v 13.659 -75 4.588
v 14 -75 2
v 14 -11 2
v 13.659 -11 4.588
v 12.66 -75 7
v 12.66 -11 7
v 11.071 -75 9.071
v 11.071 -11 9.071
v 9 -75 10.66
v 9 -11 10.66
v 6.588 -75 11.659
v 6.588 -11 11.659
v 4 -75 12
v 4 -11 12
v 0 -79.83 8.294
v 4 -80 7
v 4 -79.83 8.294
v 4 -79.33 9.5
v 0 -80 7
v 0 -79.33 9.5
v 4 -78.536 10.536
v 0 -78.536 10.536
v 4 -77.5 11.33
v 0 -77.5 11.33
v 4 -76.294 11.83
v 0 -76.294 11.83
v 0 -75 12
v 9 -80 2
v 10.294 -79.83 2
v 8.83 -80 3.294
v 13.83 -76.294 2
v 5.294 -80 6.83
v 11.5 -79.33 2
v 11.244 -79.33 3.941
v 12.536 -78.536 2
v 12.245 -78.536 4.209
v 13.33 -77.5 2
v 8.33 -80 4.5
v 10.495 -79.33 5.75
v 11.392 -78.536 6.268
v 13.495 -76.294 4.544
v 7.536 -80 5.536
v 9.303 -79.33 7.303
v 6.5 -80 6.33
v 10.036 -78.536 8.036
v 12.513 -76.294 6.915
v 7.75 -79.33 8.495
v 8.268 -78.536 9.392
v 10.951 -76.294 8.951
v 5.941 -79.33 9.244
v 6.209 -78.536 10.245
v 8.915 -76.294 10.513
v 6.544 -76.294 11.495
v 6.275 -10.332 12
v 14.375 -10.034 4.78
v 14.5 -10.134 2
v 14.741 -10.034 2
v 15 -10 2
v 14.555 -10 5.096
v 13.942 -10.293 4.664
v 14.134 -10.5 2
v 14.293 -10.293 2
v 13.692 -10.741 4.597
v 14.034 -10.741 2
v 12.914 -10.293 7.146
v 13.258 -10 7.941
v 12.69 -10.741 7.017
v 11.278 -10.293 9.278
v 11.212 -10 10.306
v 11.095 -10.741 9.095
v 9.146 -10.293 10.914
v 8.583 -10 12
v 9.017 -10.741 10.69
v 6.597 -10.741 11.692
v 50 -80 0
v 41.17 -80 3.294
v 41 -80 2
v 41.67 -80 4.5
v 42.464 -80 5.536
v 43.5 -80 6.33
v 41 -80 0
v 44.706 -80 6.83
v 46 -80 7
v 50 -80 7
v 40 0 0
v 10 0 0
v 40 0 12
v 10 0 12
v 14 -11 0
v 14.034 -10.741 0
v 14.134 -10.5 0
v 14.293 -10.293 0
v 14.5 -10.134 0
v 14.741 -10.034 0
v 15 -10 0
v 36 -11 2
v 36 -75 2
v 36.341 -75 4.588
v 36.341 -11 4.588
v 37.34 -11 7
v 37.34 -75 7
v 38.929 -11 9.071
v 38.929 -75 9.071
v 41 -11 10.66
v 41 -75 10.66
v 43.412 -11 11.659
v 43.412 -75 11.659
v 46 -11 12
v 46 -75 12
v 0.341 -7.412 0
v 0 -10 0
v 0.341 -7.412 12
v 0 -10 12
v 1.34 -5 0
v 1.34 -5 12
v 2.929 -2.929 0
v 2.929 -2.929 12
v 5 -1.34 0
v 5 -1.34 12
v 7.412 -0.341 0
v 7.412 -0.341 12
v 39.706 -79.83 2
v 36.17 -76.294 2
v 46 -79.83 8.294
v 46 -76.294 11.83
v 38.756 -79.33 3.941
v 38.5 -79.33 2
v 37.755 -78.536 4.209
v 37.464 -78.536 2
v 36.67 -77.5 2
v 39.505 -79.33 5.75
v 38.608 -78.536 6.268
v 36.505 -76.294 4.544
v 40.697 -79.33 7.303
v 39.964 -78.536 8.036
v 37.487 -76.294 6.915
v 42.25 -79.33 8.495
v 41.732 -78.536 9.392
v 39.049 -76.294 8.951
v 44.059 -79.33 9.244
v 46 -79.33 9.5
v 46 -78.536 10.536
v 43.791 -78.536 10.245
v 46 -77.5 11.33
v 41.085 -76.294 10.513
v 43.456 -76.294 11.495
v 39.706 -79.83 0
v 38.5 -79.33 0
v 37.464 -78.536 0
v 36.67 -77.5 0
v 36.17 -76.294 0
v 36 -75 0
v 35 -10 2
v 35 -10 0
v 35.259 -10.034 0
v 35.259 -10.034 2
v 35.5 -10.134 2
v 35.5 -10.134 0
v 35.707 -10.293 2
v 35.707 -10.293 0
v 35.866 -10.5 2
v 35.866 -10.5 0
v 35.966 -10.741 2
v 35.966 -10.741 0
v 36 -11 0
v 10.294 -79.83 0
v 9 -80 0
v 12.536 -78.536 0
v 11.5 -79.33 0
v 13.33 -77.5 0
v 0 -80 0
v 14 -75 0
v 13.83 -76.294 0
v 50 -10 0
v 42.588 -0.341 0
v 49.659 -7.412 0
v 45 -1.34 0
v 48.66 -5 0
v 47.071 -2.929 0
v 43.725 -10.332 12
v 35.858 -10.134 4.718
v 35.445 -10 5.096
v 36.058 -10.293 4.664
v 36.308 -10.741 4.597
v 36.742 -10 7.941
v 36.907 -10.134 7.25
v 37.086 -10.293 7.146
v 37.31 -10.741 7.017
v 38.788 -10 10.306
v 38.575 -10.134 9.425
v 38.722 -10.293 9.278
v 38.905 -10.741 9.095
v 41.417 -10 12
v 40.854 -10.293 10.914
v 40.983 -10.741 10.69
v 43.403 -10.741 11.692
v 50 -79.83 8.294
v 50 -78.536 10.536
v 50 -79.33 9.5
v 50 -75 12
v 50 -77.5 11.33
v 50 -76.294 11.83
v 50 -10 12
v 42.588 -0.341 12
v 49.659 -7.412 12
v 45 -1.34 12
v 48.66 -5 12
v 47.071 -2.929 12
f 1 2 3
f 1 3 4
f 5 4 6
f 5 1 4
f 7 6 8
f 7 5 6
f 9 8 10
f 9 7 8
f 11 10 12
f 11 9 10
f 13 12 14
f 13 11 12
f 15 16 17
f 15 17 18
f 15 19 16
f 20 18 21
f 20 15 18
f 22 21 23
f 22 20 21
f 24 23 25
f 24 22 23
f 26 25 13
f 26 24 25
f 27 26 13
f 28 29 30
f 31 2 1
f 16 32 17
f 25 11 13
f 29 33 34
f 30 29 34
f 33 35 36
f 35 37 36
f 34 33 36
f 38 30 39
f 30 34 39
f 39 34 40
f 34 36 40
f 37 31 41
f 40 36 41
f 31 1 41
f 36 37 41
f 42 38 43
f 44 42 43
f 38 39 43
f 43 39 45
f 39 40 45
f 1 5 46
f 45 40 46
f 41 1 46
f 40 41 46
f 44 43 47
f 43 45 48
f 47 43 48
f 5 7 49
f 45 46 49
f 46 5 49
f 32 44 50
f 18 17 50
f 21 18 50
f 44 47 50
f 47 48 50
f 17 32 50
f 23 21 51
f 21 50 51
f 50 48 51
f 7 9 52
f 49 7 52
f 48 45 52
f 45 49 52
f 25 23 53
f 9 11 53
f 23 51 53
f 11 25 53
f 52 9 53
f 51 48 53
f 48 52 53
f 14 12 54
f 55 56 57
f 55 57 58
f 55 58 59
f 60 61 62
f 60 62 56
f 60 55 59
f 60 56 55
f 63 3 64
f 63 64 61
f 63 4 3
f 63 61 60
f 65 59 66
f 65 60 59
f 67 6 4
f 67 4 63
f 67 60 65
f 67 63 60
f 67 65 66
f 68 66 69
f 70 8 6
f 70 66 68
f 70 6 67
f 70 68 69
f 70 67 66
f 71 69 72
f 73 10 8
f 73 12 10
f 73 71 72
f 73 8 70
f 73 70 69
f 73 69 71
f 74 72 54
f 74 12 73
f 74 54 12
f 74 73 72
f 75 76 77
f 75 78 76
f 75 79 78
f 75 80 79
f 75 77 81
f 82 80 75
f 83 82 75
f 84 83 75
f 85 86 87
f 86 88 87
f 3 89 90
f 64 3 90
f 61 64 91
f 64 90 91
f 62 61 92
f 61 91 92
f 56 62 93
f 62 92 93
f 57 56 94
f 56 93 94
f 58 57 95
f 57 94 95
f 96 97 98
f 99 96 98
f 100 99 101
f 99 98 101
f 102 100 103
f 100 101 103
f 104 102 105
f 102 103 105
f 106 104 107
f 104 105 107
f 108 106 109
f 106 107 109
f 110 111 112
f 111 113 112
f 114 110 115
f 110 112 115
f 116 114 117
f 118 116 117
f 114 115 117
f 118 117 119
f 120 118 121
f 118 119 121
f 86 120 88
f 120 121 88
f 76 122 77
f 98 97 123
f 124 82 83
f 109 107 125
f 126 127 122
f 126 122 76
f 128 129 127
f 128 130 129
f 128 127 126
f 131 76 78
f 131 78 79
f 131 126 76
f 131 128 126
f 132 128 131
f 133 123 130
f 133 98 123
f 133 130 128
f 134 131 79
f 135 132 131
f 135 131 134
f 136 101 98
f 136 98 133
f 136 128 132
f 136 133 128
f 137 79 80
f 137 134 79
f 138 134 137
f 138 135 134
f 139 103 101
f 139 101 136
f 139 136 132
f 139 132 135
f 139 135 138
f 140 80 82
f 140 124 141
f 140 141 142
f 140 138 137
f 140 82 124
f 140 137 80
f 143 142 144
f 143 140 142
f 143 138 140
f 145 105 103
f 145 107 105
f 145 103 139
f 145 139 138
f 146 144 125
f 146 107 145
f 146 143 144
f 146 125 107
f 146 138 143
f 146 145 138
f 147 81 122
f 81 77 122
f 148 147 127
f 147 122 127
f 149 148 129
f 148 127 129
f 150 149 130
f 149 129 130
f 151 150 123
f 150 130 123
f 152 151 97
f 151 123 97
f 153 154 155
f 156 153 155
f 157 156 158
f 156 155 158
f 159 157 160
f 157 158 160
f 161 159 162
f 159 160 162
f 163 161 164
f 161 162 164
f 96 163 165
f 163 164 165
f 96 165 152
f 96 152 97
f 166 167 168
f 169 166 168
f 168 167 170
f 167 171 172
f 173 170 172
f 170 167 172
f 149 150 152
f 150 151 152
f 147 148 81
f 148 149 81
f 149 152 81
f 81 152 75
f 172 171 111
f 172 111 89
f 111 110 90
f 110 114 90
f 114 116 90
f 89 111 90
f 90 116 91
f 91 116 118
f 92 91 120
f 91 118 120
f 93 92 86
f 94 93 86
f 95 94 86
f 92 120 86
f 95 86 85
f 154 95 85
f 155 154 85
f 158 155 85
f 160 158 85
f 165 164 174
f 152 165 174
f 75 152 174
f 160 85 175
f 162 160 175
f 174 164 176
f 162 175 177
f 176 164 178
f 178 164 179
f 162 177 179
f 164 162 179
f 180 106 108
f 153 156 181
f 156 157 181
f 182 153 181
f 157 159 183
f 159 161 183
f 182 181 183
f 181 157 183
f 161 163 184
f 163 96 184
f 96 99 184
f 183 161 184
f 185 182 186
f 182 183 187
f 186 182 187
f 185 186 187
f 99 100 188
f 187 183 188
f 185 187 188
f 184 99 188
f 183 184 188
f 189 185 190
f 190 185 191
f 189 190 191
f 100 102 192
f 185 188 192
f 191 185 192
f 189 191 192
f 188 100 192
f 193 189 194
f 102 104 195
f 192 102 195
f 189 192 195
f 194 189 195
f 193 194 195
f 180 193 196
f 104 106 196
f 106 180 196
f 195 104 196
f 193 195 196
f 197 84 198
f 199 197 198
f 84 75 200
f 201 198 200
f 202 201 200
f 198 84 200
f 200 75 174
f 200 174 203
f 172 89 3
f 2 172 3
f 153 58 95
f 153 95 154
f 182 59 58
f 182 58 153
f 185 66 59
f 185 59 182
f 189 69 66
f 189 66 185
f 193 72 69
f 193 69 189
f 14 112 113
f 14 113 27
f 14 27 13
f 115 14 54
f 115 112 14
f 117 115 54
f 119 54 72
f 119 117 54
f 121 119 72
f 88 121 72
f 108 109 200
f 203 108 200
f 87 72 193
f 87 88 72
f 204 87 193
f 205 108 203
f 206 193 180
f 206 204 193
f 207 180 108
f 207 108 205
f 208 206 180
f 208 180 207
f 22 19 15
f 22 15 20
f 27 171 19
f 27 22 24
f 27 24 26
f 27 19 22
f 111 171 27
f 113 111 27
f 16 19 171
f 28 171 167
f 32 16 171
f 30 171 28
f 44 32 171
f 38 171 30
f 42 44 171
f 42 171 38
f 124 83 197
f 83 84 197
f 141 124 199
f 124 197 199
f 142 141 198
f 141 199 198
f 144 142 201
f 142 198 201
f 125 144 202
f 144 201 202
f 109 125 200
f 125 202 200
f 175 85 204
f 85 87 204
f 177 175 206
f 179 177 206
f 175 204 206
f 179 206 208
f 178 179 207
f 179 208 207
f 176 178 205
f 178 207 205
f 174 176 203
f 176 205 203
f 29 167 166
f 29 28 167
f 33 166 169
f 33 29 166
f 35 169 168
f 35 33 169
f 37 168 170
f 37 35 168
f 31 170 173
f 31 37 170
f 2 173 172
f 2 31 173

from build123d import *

# Parameters (mm, degrees)
F0_W         = 50
F0_H         = 12
F1_DEPTH     = 10
F2_W         = 14
F2_H         = 12
F3_DEPTH     = 70
F4_R         = 10
F5_R         = 5
F6_T1_DEPTH  = 2
F6_T6_ANGLE  = 132.9890967712
F6_T12_ANGLE = 132.9890967712
F7_R         = 10


# Not quite as in the source:
# - a fillet or chamfer that OpenCascade refuses, or shapes differently, is made with other operations: its cross-section is extruded or revolved along the edge and cut away or added


with BuildPart() as f1:
    # F0 (on Front) → F1 (new body)
    with BuildSketch(Plane.XZ):
        with Locations((25, 6)):
            Rectangle(F0_W, F0_H)
    extrude(amount=F1_DEPTH)

    # F2 (on face) → F3 (join)
    with BuildSketch(Plane.XZ.offset(10)):
        with Locations((7, 6)):
            Rectangle(F2_W, F2_H)
        with Locations((43, 6)):
            Rectangle(F2_W, F2_H)
    extrude(amount=F3_DEPTH)

    # F4
    f4_edges = [f1.edges().sort_by_distance(p)[0] for p in [
        (14, -45, 12),
        (36, -45, 12),
    ]]
    fillet(f4_edges, radius=F4_R)

    # F5
    f5_edges = [f1.edges().sort_by_distance(p)[0] for p in [
        (11.071068, -80, 9.071068),
        (38.928932, -80, 9.071068),
        (48, -80, 12),
        (36, -80, 1),
        (2, -80, 12),
        (14, -80, 1),
    ]]
    fillet(f5_edges, radius=F5_R)

    # F6: fillet of radius 1 on 4 edges, made by hand

    # F6_s2 → F6_t1 (join)
    with BuildSketch(Plane.XY):
        with BuildLine():
            ThreePointArc((14, -11), (14.2928932188, -10.2928932188), (15, -10))
            Line((15, -10), (14, -10))
            Line((14, -10), (14, -11))
        make_face()
        with BuildLine():
            ThreePointArc((35, -10), (35.7071067812, -10.2928932188), (36, -11))
            Line((36, -11), (36, -10))
            Line((36, -10), (35, -10))
        make_face()
    extrude(amount=F6_T1_DEPTH)


with BuildPart() as f6_tool4:
    # F6_s5 → F6_t6 (revolve)
    with BuildSketch(Plane.XY.offset(2)):
        with BuildLine():
            ThreePointArc((15, -10), (14.2928932188, -10.2928932188), (14, -11))
            Line((14, -11), (14, -10))
            Line((14, -10), (15, -10))
        make_face()
    revolve(axis=Axis((4, -10, 2), (0, -1, 0)), revolution_arc=F6_T6_ANGLE)

    split(bisect_by=Plane.XY.offset(12), keep=Keep.BOTTOM)

    split(bisect_by=Plane.YZ, keep=Keep.TOP)


with BuildPart() as f1_1:
    add(f1.part)

    # F6_t3: union F6_tool4
    add(f6_tool4.part)


with BuildPart() as f6_tool10:
    # F6_s11 → F6_t12 (revolve)
    with BuildSketch(Plane.XY.offset(2)):
        with BuildLine():
            ThreePointArc((35, -10), (35.7071067812, -10.2928932188), (36, -11))
            Line((36, -11), (36, -10))
            Line((36, -10), (35, -10))
        make_face()
    revolve(axis=Axis((46, -10, 2), (0, 1, 0)), revolution_arc=F6_T12_ANGLE)

    split(bisect_by=Plane.YZ.offset(50), keep=Keep.BOTTOM)

    split(bisect_by=Plane.XY.offset(12), keep=Keep.BOTTOM)


with BuildPart() as f1_2:
    add(f1_1.part)

    # F6_t9: union F6_tool10
    add(f6_tool10.part)

    # F7
    f7_edges = [f1_2.edges().sort_by_distance(p)[0] for p in [
        (50, 0, 6),
        (0, 0, 6),
    ]]
    fillet(f7_edges, radius=F7_R)


solid = f1_2.part
